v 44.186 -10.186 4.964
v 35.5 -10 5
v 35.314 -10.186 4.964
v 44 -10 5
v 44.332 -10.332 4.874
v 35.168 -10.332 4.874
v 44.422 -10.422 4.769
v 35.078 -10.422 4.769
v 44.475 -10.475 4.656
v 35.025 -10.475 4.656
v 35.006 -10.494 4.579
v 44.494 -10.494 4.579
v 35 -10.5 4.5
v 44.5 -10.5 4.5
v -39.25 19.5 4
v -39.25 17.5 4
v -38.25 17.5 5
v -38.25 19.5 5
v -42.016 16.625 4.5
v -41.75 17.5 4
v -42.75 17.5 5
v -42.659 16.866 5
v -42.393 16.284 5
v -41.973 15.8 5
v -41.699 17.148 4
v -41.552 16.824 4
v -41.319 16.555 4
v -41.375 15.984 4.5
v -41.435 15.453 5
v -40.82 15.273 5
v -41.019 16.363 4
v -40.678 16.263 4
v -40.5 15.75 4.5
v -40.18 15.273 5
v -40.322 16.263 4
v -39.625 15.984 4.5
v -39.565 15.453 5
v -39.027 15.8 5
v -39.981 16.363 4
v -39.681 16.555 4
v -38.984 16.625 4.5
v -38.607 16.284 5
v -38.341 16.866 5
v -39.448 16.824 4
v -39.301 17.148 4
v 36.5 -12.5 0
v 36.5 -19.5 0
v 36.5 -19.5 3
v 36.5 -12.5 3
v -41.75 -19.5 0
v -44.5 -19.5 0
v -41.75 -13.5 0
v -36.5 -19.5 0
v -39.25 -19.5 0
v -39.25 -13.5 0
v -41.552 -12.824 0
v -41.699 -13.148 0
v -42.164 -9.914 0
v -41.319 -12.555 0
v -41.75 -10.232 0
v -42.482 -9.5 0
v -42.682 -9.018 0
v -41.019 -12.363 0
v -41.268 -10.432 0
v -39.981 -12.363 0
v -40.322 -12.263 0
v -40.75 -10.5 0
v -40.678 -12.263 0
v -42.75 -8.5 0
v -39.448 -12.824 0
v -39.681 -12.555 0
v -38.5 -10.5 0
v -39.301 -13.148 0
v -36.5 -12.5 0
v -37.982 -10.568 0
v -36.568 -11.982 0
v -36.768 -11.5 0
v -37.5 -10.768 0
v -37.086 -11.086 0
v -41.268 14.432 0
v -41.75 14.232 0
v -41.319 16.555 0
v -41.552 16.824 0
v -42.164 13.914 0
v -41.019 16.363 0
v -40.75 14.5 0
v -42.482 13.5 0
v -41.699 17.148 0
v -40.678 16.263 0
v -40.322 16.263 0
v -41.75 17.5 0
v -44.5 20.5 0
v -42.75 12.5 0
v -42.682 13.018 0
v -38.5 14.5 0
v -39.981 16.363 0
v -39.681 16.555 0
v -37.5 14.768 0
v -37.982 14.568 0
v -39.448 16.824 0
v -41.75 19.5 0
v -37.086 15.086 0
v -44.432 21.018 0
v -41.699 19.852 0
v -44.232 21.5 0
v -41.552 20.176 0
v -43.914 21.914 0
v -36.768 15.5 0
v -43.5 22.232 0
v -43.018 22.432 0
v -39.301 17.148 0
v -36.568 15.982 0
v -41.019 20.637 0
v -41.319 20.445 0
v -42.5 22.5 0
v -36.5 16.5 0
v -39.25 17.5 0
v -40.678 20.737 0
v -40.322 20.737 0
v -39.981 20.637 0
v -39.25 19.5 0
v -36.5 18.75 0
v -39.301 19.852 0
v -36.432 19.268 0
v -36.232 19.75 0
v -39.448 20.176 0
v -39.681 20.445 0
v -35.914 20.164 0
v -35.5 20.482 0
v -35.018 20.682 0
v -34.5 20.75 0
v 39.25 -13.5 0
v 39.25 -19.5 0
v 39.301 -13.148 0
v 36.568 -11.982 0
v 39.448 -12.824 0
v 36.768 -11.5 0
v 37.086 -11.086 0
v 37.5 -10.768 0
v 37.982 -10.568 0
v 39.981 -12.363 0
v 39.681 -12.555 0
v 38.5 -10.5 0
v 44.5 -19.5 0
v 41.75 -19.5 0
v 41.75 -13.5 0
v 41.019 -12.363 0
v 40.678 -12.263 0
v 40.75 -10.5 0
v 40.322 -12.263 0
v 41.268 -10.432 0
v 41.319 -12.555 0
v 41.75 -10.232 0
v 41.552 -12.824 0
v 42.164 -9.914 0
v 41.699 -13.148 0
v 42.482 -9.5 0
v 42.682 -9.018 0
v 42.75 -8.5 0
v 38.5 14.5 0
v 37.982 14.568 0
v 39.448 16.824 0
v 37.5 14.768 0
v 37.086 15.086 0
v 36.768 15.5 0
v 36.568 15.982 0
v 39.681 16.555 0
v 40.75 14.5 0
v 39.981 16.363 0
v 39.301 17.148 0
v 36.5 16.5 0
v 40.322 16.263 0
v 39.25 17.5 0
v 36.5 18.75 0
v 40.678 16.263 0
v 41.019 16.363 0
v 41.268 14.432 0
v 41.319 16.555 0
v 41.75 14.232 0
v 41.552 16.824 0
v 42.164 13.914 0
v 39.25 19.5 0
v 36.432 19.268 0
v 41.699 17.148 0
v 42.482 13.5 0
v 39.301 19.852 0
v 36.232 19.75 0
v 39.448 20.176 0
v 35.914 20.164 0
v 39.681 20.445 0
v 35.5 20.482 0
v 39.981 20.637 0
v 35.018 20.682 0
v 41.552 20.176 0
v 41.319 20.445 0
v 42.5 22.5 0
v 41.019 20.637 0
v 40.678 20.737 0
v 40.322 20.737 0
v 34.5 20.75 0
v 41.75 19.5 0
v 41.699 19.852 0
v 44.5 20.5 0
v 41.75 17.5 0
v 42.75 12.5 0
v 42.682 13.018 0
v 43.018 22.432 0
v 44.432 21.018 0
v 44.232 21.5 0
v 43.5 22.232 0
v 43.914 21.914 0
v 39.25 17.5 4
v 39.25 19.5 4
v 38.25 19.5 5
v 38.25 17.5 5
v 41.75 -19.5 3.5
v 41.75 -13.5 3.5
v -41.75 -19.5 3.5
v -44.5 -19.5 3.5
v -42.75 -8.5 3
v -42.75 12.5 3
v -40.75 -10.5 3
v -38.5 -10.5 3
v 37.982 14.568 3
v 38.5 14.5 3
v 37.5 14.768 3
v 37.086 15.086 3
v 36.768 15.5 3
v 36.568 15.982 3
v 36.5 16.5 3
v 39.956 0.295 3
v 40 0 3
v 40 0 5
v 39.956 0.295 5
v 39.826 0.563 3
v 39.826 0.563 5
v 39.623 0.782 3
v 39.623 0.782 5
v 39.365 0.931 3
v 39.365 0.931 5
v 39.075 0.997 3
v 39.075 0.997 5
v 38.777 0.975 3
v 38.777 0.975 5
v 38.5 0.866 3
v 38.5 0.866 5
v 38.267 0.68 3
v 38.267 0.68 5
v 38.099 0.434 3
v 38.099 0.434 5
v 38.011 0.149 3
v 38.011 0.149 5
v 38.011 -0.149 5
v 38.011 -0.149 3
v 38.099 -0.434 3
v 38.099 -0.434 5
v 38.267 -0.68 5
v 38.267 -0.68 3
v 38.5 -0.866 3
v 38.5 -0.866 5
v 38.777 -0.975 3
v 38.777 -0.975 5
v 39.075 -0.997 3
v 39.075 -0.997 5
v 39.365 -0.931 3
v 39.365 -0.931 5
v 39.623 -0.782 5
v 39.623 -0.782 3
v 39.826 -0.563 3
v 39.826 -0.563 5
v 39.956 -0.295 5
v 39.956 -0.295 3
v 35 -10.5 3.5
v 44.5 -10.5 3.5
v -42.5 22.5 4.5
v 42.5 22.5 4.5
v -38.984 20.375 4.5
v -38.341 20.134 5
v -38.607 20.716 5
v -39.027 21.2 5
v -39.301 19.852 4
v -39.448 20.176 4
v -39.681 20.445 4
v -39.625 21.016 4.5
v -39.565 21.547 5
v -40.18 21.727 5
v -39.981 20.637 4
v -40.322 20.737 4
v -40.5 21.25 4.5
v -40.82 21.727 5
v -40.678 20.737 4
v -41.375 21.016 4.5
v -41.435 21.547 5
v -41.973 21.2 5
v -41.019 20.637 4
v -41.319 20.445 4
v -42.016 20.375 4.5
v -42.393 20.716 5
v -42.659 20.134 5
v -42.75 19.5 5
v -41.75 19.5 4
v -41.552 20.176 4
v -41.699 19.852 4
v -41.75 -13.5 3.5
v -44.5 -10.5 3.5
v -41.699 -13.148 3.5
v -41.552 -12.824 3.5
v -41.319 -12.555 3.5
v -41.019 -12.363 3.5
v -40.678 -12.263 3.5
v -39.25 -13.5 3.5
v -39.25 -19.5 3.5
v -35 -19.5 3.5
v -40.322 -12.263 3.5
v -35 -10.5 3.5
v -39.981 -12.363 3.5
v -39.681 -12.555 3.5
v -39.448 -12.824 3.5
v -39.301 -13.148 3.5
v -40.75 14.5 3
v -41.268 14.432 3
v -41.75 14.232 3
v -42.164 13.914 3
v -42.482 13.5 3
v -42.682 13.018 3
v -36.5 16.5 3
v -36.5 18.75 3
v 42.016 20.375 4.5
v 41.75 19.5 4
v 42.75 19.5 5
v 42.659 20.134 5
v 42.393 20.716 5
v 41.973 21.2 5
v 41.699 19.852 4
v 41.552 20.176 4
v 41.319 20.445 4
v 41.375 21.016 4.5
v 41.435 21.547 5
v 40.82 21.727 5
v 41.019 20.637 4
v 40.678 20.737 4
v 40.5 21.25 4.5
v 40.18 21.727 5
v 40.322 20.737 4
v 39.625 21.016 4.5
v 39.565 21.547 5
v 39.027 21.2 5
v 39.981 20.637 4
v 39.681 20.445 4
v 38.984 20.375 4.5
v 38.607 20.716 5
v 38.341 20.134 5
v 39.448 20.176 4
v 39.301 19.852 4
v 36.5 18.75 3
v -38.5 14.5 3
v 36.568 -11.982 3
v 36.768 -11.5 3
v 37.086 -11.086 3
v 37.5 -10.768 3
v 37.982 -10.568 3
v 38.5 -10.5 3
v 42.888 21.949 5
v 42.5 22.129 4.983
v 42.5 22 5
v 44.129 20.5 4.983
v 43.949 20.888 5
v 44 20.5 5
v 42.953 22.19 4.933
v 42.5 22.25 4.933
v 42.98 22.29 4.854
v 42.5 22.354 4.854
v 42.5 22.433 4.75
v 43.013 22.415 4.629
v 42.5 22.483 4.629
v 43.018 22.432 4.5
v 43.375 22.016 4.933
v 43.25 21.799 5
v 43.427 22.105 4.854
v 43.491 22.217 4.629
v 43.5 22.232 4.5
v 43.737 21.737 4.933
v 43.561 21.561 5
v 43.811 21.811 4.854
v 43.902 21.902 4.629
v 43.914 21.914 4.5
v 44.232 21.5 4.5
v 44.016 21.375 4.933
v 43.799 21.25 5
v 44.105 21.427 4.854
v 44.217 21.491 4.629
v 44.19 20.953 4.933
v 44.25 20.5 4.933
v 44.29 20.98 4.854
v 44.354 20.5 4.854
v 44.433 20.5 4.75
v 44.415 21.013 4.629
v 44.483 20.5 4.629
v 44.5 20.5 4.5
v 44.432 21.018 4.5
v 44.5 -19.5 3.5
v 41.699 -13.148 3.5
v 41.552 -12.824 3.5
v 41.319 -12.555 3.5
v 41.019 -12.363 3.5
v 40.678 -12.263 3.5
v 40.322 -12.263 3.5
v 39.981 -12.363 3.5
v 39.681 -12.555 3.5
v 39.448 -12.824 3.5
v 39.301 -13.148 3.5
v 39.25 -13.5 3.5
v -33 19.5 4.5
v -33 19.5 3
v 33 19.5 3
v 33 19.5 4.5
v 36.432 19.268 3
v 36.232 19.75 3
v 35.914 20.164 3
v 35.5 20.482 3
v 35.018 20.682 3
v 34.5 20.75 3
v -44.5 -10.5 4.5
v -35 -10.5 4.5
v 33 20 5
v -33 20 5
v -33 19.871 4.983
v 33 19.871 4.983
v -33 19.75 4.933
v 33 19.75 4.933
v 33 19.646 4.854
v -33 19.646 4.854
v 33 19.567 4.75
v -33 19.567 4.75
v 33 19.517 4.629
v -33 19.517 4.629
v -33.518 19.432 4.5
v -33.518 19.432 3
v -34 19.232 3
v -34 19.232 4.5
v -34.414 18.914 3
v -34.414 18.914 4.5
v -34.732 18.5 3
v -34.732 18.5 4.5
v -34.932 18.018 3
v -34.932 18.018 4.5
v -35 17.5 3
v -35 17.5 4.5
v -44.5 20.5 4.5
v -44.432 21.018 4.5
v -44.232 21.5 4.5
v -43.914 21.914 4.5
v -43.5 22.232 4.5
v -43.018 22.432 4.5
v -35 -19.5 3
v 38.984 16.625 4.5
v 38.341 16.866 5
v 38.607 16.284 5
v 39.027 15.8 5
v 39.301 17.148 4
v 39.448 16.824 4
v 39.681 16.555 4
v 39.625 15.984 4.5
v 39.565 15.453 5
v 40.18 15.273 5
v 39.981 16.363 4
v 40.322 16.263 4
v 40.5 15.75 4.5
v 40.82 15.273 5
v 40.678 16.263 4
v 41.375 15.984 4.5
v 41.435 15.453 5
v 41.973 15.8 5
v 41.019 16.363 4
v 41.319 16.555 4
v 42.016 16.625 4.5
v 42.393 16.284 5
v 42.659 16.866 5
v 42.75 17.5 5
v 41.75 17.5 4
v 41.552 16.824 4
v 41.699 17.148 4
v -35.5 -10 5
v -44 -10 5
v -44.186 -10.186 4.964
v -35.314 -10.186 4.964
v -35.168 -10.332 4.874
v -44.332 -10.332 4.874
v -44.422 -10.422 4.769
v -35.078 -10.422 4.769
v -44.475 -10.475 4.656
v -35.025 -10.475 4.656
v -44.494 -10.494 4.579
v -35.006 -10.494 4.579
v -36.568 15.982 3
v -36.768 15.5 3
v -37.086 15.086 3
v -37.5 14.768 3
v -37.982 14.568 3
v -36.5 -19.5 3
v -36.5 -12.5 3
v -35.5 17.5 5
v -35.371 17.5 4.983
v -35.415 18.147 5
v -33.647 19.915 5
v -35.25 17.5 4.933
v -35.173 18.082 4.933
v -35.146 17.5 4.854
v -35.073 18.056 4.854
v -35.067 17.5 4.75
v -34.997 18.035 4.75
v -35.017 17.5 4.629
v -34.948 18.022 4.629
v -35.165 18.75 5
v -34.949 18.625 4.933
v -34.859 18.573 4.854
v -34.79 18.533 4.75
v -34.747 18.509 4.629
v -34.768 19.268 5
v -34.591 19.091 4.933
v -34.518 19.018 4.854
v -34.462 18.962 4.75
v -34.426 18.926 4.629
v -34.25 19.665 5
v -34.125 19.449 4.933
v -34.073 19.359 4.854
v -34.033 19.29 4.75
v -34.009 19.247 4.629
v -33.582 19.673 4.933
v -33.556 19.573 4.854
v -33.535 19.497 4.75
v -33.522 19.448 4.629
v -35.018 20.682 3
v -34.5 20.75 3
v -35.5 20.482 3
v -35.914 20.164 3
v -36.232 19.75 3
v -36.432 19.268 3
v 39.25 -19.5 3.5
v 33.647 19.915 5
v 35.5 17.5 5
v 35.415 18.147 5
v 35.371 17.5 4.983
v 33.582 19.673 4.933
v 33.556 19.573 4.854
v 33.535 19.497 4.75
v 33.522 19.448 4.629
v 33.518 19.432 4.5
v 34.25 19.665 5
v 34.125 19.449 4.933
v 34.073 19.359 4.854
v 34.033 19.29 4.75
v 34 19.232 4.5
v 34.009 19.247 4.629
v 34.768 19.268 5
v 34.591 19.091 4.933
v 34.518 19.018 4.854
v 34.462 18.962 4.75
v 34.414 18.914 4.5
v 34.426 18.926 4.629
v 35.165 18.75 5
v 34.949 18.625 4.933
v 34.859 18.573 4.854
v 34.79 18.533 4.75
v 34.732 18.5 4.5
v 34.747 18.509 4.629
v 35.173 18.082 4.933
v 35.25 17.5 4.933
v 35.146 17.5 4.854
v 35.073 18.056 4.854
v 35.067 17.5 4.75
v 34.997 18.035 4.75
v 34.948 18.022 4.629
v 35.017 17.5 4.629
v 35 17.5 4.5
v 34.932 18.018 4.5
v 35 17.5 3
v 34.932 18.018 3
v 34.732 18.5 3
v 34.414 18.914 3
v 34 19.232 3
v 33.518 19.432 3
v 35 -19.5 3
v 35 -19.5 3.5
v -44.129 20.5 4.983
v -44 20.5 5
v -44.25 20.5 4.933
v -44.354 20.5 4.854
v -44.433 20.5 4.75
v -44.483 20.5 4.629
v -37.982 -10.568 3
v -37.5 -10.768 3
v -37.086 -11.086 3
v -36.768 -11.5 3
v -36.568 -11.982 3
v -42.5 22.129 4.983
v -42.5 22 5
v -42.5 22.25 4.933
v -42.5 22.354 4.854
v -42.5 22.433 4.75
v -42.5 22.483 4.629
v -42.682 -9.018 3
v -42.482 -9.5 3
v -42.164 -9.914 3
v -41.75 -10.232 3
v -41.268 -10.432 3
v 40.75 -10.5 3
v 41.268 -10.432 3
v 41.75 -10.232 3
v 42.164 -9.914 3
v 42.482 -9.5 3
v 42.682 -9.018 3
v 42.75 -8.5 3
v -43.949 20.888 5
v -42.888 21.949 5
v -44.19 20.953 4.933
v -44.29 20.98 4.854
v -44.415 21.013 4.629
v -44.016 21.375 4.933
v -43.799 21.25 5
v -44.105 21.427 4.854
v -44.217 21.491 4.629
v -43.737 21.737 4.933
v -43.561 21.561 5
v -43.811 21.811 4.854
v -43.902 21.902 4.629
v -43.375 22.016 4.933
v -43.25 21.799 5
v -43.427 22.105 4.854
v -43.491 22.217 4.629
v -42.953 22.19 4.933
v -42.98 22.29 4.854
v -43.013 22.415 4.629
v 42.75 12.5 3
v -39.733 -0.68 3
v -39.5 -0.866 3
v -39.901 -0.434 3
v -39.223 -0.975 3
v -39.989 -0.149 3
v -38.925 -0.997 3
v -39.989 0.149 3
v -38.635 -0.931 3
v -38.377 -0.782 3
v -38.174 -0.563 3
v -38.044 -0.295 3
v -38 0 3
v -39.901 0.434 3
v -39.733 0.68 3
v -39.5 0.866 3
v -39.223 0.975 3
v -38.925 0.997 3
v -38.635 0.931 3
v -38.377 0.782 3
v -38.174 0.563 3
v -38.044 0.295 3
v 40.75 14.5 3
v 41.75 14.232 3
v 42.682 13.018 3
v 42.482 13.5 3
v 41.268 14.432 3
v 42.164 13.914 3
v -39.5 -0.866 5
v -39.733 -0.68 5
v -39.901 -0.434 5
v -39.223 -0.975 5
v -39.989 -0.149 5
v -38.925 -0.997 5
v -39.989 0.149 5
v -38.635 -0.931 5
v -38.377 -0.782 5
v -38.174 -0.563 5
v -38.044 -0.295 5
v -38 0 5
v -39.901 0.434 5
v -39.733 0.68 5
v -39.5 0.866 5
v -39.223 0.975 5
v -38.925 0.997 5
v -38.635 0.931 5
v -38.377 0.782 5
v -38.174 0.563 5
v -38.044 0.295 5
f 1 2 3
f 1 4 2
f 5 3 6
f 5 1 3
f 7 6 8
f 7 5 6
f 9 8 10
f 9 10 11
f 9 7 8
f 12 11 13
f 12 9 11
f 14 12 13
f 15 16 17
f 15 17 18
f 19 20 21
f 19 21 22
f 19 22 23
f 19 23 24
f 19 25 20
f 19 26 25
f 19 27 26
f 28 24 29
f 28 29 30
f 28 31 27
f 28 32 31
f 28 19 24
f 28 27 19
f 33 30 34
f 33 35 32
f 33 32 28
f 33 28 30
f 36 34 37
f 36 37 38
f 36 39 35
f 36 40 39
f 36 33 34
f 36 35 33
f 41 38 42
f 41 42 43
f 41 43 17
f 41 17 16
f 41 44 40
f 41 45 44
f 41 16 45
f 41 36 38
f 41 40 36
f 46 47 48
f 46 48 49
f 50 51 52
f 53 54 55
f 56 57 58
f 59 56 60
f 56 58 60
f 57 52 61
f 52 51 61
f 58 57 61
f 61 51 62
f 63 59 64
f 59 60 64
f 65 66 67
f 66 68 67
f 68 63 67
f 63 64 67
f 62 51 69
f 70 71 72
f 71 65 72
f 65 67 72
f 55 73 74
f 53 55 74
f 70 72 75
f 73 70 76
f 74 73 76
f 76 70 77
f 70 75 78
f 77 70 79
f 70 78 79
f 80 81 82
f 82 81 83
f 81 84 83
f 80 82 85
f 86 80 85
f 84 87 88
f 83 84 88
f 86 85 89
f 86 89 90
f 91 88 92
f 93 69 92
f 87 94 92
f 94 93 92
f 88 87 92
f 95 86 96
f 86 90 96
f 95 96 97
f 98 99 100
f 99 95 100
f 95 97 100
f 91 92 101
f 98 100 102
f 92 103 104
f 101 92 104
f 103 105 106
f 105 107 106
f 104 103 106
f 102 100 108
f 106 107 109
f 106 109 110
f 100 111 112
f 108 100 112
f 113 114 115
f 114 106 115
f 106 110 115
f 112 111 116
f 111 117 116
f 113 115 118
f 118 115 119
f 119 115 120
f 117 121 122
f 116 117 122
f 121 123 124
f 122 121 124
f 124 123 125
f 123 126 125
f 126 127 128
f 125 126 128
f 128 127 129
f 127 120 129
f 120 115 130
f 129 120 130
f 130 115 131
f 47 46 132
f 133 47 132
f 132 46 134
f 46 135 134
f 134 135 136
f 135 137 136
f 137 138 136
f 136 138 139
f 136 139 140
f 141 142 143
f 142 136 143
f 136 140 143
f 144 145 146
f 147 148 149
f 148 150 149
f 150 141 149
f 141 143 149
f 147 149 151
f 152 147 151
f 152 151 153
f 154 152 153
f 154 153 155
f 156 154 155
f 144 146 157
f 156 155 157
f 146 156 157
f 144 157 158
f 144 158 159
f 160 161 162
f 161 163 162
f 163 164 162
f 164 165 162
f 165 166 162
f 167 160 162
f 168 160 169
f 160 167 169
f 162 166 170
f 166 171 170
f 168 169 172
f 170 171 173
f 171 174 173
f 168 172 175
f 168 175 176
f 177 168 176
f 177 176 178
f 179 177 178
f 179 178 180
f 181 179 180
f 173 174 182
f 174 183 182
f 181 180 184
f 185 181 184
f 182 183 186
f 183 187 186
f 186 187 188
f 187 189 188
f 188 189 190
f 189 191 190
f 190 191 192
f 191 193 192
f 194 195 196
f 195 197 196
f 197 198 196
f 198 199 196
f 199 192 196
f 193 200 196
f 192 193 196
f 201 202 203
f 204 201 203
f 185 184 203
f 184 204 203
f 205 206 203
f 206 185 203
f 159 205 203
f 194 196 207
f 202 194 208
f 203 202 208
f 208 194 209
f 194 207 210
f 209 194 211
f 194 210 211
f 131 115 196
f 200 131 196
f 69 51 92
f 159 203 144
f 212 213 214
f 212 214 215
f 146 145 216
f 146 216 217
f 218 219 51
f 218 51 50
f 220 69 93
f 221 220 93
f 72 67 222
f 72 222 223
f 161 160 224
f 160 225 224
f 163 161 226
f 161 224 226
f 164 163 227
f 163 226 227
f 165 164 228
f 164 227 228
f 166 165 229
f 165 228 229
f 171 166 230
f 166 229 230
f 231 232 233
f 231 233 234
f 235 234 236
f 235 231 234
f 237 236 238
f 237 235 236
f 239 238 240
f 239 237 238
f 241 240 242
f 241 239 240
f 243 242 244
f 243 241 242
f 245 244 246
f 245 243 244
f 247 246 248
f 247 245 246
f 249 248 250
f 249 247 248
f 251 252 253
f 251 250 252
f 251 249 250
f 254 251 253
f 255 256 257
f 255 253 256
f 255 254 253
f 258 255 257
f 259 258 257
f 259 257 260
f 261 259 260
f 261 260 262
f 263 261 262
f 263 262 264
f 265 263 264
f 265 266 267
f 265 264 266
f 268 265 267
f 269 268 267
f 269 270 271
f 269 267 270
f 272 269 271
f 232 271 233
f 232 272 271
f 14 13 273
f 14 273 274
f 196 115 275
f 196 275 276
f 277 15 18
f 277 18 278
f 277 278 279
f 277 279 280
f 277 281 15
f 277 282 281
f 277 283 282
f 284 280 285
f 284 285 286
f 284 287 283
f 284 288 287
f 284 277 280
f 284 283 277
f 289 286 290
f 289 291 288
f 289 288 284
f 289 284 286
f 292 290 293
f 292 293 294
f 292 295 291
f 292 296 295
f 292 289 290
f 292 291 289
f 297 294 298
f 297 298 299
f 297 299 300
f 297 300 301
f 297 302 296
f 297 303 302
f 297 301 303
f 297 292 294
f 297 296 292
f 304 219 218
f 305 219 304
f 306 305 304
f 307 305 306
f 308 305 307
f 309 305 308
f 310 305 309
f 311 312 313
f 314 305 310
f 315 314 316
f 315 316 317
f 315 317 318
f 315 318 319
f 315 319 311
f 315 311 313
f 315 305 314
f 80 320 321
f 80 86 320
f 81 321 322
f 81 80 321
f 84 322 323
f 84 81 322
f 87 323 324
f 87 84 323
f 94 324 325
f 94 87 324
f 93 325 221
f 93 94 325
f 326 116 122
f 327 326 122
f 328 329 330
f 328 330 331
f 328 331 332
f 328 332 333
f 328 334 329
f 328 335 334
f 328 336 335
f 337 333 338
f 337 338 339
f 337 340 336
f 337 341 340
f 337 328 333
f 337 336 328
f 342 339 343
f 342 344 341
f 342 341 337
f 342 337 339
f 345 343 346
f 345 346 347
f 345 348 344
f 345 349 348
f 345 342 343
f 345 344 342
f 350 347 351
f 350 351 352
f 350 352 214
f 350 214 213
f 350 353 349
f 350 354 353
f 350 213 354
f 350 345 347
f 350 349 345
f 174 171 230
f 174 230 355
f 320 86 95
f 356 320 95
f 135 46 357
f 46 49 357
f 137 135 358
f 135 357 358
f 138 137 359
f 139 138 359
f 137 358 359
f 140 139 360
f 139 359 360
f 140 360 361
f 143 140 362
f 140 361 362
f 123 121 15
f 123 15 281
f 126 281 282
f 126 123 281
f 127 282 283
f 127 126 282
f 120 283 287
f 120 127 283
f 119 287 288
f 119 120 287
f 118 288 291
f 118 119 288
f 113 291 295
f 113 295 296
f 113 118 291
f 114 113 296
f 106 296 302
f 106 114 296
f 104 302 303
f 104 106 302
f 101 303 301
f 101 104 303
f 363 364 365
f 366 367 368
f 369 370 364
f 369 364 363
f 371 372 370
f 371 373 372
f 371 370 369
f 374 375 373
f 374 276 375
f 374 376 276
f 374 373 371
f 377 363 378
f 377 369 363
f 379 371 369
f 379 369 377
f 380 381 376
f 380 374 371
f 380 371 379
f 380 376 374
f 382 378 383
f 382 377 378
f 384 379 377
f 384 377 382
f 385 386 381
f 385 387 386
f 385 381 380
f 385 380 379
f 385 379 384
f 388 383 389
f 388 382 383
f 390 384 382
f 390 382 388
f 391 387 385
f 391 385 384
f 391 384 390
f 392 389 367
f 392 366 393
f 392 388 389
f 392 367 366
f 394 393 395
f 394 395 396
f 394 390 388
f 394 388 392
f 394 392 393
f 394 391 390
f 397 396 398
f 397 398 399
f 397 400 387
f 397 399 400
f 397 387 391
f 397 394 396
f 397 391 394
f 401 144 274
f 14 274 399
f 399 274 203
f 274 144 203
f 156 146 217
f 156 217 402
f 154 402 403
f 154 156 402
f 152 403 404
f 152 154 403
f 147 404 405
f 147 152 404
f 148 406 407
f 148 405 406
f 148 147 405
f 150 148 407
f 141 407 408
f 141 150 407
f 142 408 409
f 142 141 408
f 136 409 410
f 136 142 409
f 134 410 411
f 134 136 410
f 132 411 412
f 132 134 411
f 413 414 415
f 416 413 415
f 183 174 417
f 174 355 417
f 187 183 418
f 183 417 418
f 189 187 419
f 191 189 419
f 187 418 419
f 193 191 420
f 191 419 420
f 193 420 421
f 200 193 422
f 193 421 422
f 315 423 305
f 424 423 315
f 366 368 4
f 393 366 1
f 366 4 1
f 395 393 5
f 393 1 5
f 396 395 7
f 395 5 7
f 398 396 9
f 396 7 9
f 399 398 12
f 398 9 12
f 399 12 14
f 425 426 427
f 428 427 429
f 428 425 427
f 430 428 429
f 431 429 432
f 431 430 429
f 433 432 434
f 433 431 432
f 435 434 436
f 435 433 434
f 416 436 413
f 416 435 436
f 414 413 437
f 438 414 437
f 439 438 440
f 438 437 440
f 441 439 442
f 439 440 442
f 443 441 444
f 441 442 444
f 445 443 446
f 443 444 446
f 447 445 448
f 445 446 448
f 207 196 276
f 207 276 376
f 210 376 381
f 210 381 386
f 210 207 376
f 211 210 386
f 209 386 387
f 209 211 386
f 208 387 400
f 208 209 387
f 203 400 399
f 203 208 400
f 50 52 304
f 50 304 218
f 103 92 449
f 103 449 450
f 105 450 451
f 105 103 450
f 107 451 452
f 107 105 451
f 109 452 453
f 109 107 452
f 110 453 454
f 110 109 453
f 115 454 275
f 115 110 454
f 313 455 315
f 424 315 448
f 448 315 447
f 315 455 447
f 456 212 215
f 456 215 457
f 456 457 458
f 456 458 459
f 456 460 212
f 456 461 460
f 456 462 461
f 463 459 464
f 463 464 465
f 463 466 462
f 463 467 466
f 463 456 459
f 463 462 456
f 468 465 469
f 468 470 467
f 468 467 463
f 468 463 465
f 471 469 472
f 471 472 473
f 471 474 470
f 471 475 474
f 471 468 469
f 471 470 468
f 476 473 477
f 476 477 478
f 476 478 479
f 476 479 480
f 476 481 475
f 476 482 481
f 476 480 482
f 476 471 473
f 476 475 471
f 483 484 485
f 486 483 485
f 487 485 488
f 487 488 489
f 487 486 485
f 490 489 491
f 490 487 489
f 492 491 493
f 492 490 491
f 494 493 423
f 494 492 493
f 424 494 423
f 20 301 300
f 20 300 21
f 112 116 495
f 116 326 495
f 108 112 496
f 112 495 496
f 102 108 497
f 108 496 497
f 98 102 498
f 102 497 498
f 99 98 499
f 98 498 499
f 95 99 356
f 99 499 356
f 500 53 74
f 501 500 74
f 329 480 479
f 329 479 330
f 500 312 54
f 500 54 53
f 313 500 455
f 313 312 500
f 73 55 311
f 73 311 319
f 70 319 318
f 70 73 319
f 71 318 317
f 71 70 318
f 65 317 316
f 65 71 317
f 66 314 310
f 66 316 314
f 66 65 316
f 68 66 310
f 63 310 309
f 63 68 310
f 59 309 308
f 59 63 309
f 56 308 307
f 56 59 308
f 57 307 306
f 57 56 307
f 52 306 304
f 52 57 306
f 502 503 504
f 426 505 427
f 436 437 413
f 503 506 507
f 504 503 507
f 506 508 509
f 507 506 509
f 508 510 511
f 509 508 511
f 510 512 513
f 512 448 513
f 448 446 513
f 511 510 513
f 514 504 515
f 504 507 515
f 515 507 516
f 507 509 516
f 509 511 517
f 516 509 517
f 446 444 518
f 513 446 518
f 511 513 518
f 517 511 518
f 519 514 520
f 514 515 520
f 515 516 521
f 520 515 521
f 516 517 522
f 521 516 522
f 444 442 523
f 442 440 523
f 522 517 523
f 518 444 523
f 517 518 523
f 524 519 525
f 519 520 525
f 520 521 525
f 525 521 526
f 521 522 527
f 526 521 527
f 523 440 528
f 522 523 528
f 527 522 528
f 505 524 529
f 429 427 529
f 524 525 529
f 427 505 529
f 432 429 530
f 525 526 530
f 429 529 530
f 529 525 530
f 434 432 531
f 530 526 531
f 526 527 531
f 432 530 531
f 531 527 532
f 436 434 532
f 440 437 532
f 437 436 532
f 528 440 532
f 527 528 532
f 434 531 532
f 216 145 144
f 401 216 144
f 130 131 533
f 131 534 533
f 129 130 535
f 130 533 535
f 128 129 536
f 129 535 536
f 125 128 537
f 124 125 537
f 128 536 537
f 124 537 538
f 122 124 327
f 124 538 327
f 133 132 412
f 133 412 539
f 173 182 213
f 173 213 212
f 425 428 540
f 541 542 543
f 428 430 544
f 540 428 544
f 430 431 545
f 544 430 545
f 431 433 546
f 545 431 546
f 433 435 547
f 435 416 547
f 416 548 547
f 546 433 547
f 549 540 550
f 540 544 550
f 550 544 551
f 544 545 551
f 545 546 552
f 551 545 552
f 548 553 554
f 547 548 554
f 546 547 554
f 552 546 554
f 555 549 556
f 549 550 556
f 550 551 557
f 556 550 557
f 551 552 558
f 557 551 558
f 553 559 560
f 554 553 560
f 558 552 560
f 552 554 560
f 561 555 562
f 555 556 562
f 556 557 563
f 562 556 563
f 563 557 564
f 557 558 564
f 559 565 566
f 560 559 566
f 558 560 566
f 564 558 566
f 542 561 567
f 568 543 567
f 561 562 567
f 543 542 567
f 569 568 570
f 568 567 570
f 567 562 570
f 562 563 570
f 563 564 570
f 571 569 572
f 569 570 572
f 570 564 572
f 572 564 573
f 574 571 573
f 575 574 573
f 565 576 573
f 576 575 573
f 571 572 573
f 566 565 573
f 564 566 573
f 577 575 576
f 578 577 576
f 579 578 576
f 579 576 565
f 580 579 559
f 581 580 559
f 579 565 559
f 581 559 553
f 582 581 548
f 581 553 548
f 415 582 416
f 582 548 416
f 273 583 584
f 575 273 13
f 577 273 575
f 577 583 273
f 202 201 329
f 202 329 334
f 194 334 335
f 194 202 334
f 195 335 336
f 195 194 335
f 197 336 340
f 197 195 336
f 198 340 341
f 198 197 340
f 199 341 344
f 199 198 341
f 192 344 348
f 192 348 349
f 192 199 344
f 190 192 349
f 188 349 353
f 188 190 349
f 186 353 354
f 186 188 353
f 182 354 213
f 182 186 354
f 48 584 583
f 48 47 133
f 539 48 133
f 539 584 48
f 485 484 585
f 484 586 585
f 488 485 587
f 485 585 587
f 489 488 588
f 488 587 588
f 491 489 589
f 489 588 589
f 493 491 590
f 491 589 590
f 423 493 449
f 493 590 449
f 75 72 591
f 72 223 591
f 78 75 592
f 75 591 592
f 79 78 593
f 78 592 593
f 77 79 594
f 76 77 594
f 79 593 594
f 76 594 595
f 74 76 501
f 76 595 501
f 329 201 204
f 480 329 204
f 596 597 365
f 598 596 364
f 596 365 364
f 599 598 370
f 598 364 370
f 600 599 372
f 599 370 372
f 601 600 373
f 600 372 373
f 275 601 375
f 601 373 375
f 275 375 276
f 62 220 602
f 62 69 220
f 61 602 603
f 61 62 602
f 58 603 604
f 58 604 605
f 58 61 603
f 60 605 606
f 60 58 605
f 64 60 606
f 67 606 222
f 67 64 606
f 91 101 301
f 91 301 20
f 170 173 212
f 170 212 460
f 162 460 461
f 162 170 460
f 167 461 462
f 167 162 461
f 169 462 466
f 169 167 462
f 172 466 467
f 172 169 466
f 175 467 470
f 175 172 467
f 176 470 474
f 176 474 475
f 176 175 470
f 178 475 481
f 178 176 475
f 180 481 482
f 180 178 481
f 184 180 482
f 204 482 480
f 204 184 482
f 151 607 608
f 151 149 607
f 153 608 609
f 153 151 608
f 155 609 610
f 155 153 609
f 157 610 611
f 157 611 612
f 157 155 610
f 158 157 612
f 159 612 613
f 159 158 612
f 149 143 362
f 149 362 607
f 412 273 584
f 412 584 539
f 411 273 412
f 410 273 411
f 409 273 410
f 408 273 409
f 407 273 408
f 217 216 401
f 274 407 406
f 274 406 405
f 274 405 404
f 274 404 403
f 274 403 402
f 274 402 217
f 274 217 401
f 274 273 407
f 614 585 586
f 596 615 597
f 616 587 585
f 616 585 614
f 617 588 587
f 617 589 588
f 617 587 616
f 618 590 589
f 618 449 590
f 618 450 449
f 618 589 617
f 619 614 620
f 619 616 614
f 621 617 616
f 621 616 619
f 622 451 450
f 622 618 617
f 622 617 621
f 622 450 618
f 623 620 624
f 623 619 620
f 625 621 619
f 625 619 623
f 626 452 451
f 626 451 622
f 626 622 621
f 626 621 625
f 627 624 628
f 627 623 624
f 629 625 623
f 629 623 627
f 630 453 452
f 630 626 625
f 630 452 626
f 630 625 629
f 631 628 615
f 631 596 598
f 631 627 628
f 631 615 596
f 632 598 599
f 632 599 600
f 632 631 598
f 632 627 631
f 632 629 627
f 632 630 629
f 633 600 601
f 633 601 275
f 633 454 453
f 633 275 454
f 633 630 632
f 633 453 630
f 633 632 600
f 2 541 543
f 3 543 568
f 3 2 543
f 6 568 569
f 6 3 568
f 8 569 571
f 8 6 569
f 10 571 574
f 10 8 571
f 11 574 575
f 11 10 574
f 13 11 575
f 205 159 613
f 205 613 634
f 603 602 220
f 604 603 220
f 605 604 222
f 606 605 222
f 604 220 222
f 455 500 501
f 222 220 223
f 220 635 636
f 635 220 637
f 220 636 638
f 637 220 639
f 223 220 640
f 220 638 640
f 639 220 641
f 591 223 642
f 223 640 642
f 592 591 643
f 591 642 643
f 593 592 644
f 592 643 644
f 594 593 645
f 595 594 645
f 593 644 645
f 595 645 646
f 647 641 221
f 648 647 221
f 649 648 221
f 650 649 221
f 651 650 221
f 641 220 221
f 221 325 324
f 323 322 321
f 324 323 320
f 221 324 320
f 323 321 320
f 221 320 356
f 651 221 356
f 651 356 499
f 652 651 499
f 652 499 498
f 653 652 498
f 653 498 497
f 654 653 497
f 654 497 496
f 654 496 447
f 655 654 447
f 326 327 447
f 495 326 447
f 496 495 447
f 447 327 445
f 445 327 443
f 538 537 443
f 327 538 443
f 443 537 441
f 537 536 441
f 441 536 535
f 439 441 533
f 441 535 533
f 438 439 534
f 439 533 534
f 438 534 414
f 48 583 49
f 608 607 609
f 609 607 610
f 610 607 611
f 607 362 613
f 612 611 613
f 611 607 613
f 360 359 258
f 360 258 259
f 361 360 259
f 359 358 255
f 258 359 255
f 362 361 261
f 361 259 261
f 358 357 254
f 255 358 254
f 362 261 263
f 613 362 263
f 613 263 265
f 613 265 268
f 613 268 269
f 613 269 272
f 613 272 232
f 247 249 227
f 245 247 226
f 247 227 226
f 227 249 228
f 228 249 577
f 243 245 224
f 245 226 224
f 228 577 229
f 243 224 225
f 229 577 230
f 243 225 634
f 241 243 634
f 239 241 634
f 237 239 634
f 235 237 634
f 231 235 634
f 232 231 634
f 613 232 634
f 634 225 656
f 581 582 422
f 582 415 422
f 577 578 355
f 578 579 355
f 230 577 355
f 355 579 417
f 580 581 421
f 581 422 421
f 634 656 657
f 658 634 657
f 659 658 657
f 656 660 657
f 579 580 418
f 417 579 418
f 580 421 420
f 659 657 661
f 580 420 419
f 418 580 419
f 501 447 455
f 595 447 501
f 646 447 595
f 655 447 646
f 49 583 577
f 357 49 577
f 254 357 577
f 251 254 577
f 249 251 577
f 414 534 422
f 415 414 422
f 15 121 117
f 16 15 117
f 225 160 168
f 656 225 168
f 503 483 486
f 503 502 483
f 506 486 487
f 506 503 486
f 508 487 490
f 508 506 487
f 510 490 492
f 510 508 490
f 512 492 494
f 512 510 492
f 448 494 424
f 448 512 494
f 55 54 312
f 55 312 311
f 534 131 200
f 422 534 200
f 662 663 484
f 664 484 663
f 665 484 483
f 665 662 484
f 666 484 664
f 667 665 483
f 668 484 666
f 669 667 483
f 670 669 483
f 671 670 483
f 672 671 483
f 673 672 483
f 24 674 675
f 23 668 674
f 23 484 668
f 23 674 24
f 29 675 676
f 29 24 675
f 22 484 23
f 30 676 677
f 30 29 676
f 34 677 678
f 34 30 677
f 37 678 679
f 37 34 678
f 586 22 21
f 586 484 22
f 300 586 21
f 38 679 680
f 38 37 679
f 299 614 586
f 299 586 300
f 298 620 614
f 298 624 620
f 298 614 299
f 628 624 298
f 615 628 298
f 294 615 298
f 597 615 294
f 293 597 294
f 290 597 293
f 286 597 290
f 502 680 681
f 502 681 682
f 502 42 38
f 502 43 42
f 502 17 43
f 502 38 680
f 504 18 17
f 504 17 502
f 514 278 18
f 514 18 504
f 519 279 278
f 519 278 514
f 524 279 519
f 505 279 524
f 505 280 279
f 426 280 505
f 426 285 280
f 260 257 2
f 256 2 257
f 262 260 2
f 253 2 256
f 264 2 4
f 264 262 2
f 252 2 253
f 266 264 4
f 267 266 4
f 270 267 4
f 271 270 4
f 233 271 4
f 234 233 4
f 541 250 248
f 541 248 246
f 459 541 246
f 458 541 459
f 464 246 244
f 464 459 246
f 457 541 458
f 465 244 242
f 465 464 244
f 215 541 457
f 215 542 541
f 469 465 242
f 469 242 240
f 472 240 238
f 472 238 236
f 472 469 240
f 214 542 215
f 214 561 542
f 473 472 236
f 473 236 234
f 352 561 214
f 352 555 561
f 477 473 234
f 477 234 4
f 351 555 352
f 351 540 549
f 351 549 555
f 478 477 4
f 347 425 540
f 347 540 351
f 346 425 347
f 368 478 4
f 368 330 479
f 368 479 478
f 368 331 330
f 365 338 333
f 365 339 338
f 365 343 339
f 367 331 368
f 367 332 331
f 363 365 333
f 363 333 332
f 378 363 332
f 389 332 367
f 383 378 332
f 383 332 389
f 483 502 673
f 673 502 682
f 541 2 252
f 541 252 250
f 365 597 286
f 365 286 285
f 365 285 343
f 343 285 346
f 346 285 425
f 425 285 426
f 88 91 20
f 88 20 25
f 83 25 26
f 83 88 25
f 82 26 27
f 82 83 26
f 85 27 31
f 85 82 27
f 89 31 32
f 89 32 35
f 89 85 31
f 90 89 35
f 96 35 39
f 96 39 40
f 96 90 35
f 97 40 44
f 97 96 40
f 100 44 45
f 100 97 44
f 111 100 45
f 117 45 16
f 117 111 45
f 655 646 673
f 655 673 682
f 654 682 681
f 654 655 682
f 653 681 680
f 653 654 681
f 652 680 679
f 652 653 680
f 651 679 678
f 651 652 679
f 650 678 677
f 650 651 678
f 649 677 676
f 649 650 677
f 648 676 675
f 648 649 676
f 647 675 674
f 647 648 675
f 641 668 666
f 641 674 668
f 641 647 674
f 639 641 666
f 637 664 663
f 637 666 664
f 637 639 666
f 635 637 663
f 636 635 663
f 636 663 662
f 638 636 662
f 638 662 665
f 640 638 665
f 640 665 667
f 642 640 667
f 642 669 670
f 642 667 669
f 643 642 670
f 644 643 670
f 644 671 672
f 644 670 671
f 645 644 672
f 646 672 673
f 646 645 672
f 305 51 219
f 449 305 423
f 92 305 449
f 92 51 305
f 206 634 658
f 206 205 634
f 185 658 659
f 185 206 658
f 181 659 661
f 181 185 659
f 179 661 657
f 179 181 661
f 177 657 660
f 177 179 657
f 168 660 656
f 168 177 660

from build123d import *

# Parameters (mm, degrees)
F0_W      = 89
F0_H      = 45
F1_DEPTH  = 5
F2_W      = 70
F2_H      = 39
F3_DEPTH  = 25
F4_W      = 85.5
F4_H      = 41.5
F5_DEPTH  = 3
F6_W      = 8
F6_H      = 8
F6_H_2    = 12
F7_DEPTH  = 3
F8_R      = 1
F9_DEPTH  = 25
F10_DEPTH = 25
F11_W     = 2.5
F11_H     = 2
F12_DEPTH = 25
F13_W     = 89
F13_H     = 3
F14_DEPTH = 25
F15_W     = 89
F15_H     = 9
F16_DEPTH = 1.5
F17_SIZE  = 1
F18_SIZE  = 1
F19_R     = 2
F20_R     = 0.5


with BuildPart() as f1:
    # F0 (on Top) → F1 (new body)
    with BuildSketch(Plane.XY):
        Rectangle(F0_W, F0_H)
    extrude(amount=F1_DEPTH)

    # F2 (on Top) → F3 (cut)
    with BuildSketch(Plane.XY):
        Rectangle(F2_W, F2_H)
    extrude(amount=F3_DEPTH, mode=Mode.SUBTRACT)

    # F4 (on Top) → F5 (cut)
    with BuildSketch(Plane.XY):
        Rectangle(F4_W, F4_H)
    extrude(amount=F5_DEPTH, mode=Mode.SUBTRACT)

    # F6 (on Top) → F7 (join)
    with BuildSketch(Plane.XY):
        with Locations((-40.5, 18.5)):
            Rectangle(F6_W, F6_H)
        with Locations((-40.5, -16.5)):
            Rectangle(F6_W, F6_H_2)
        with Locations((40.5, 18.5)):
            Rectangle(F6_W, F6_H)
        with Locations((40.5, -16.5)):
            Rectangle(F6_W, F6_H_2)
    extrude(amount=F7_DEPTH)

    # F8 (on Top) → F9 (cut)
    with BuildSketch(Plane.XY):
        with BuildLine():
            Line((39.25, -13.5), (41.75, -13.5))
            ThreePointArc((41.75, -13.5), (40.5, -12.25), (39.25, -13.5))
        make_face()
        with BuildLine():
            Line((41.75, -23.5), (41.75, -13.5))
            ThreePointArc((41.75, -13.5), (40.5, -14.75), (39.25, -13.5))
            Line((39.25, -13.5), (39.25, -23.5))
            Line((39.25, -23.5), (41.75, -23.5))
        make_face()
        with BuildLine():
            ThreePointArc((39.25, -13.5), (40.5, -14.75), (41.75, -13.5))
            Line((41.75, -13.5), (39.25, -13.5))
        make_face()
        with BuildLine():
            ThreePointArc((41.25, 18.5), (41.6180339887, 18.9409830056), (41.75, 19.5))
            ThreePointArc((41.75, 19.5), (39.9409830056, 20.6180339887), (39.75, 18.5))
            ThreePointArc((39.75, 18.5), (40.5, 18.75), (41.25, 18.5))
        make_face()
        with BuildLine():
            ThreePointArc((41.25, 18.5), (40.5, 18.75), (39.75, 18.5))
            ThreePointArc((39.75, 18.5), (40.5, 18.25), (41.25, 18.5))
        make_face()
        with BuildLine():
            ThreePointArc((41.25, 18.5), (40.5, 18.25), (39.75, 18.5))
            ThreePointArc((39.75, 18.5), (39.9409830056, 16.3819660113), (41.75, 17.5))
            ThreePointArc((41.75, 17.5), (41.6180339887, 18.0590169944), (41.25, 18.5))
        make_face()
        with BuildLine():
            Line((-41.75, -13.5), (-39.25, -13.5))
            ThreePointArc((-39.25, -13.5), (-40.5, -12.25), (-41.75, -13.5))
        make_face()
        with BuildLine():
            Line((-39.25, -23.5), (-39.25, -13.5))
            ThreePointArc((-39.25, -13.5), (-40.5, -14.75), (-41.75, -13.5))
            Line((-41.75, -13.5), (-41.75, -23.5))
            Line((-41.75, -23.5), (-39.25, -23.5))
        make_face()
        with BuildLine():
            ThreePointArc((-41.75, -13.5), (-40.5, -14.75), (-39.25, -13.5))
            Line((-39.25, -13.5), (-41.75, -13.5))
        make_face()
        with BuildLine():
            ThreePointArc((-39.75, 18.5), (-39.3819660113, 18.9409830056), (-39.25, 19.5))
            ThreePointArc((-39.25, 19.5), (-41.0590169944, 20.6180339887), (-41.25, 18.5))
            ThreePointArc((-41.25, 18.5), (-40.5, 18.75), (-39.75, 18.5))
        make_face()
        with BuildLine():
            ThreePointArc((-39.75, 18.5), (-40.5, 18.75), (-41.25, 18.5))
            ThreePointArc((-41.25, 18.5), (-40.5, 18.25), (-39.75, 18.5))
        make_face()
        with BuildLine():
            ThreePointArc((-39.75, 18.5), (-40.5, 18.25), (-41.25, 18.5))
            ThreePointArc((-41.25, 18.5), (-41.0590169944, 16.3819660113), (-39.25, 17.5))
            ThreePointArc((-39.25, 17.5), (-39.3819660113, 18.0590169944), (-39.75, 18.5))
        make_face()
        with Locations((-39, 0)):
            Circle(F8_R)
        with Locations((39, 0)):
            Circle(F8_R)
    extrude(amount=F9_DEPTH, mode=Mode.SUBTRACT)

    # F8 (on Top) → F10 (cut)
    with BuildSketch(Plane.XY):
        with BuildLine():
            Line((39.25, -13.5), (41.75, -13.5))
            ThreePointArc((41.75, -13.5), (40.5, -12.25), (39.25, -13.5))
        make_face()
        with BuildLine():
            Line((41.75, -23.5), (41.75, -13.5))
            ThreePointArc((41.75, -13.5), (40.5, -14.75), (39.25, -13.5))
            Line((39.25, -13.5), (39.25, -23.5))
            Line((39.25, -23.5), (41.75, -23.5))
        make_face()
        with BuildLine():
            ThreePointArc((39.25, -13.5), (40.5, -14.75), (41.75, -13.5))
            Line((41.75, -13.5), (39.25, -13.5))
        make_face()
        with BuildLine():
            ThreePointArc((41.25, 18.5), (41.6180339887, 18.9409830056), (41.75, 19.5))
            ThreePointArc((41.75, 19.5), (39.9409830056, 20.6180339887), (39.75, 18.5))
            ThreePointArc((39.75, 18.5), (40.5, 18.75), (41.25, 18.5))
        make_face()
        with BuildLine():
            ThreePointArc((41.25, 18.5), (40.5, 18.75), (39.75, 18.5))
            ThreePointArc((39.75, 18.5), (40.5, 18.25), (41.25, 18.5))
        make_face()
        with BuildLine():
            ThreePointArc((41.25, 18.5), (40.5, 18.25), (39.75, 18.5))
            ThreePointArc((39.75, 18.5), (39.9409830056, 16.3819660113), (41.75, 17.5))
            ThreePointArc((41.75, 17.5), (41.6180339887, 18.0590169944), (41.25, 18.5))
        make_face()
        with BuildLine():
            Line((-41.75, -13.5), (-39.25, -13.5))
            ThreePointArc((-39.25, -13.5), (-40.5, -12.25), (-41.75, -13.5))
        make_face()
        with BuildLine():
            Line((-39.25, -23.5), (-39.25, -13.5))
            ThreePointArc((-39.25, -13.5), (-40.5, -14.75), (-41.75, -13.5))
            Line((-41.75, -13.5), (-41.75, -23.5))
            Line((-41.75, -23.5), (-39.25, -23.5))
        make_face()
        with BuildLine():
            ThreePointArc((-41.75, -13.5), (-40.5, -14.75), (-39.25, -13.5))
            Line((-39.25, -13.5), (-41.75, -13.5))
        make_face()
        with BuildLine():
            ThreePointArc((-39.75, 18.5), (-39.3819660113, 18.9409830056), (-39.25, 19.5))
            ThreePointArc((-39.25, 19.5), (-41.0590169944, 20.6180339887), (-41.25, 18.5))
            ThreePointArc((-41.25, 18.5), (-40.5, 18.75), (-39.75, 18.5))
        make_face()
        with BuildLine():
            ThreePointArc((-39.75, 18.5), (-40.5, 18.75), (-41.25, 18.5))
            ThreePointArc((-41.25, 18.5), (-40.5, 18.25), (-39.75, 18.5))
        make_face()
        with BuildLine():
            ThreePointArc((-39.75, 18.5), (-40.5, 18.25), (-41.25, 18.5))
            ThreePointArc((-41.25, 18.5), (-41.0590169944, 16.3819660113), (-39.25, 17.5))
            ThreePointArc((-39.25, 17.5), (-39.3819660113, 18.0590169944), (-39.75, 18.5))
        make_face()
        with Locations((-39, 0)):
            Circle(F8_R)
        with Locations((39, 0)):
            Circle(F8_R)
    extrude(amount=F10_DEPTH, mode=Mode.SUBTRACT)

    # F11 (on face) → F12 (cut)
    with BuildSketch(Plane(origin=(0, 0, 0), x_dir=(1, 0, 0), z_dir=(0, 0, -1))):
        with Locations((-40.5, -18.5)):
            Rectangle(F11_W, F11_H)
        with Locations((40.5, -18.5)):
            Rectangle(F11_W, F11_H)
    extrude(amount=-F12_DEPTH, mode=Mode.SUBTRACT)

    # F13 (on face) → F14 (cut)
    with BuildSketch(Plane.XY.offset(5)):
        with Locations((0, -21)):
            Rectangle(F13_W, F13_H)
    extrude(amount=-F14_DEPTH, mode=Mode.SUBTRACT)

    # F15 (on face) → F16 (cut)
    with BuildSketch(Plane.XY.offset(5)):
        with Locations((0, -15)):
            Rectangle(F15_W, F15_H)
    extrude(amount=-F16_DEPTH, mode=Mode.SUBTRACT)

    # F17
    f17_edges = [f1.edges().sort_by_distance(p)[0] for p in [
        (41.75, 18.5, 5),
    ]]
    chamfer(f17_edges, length=F17_SIZE)

    # F18
    f18_edges = [f1.edges().sort_by_distance(p)[0] for p in [
        (-39.25, 18.5, 5),
    ]]
    chamfer(f18_edges, length=F18_SIZE)

    # F19
    f19_edges = [f1.edges().sort_by_distance(p)[0] for p in [
        (-44.5, 22.5, 2.5),
        (44.5, 22.5, 2.5),
        (35, 19.5, 4),
        (-35, 19.5, 4),
        (-36.5, 14.5, 1.5),
        (-36.5, 20.75, 1.5),
        (-42.75, 14.5, 1.5),
        (-42.75, -10.5, 1.5),
        (-36.5, -10.5, 1.5),
        (36.5, 20.75, 1.5),
        (36.5, 14.5, 1.5),
        (42.75, 14.5, 1.5),
        (42.75, -10.5, 1.5),
        (36.5, -10.5, 1.5),
    ]]
    fillet(f19_edges, radius=F19_R)

    # F20
    f20_edges = [f1.edges().sort_by_distance(p)[0] for p in [
        (0, 22.5, 5),
        (-39.75, -10.5, 5),
        (39.75, -10.5, 5),
        (35, 3.5, 5),
    ]]
    fillet(f20_edges, radius=F20_R)


solid = f1.part
